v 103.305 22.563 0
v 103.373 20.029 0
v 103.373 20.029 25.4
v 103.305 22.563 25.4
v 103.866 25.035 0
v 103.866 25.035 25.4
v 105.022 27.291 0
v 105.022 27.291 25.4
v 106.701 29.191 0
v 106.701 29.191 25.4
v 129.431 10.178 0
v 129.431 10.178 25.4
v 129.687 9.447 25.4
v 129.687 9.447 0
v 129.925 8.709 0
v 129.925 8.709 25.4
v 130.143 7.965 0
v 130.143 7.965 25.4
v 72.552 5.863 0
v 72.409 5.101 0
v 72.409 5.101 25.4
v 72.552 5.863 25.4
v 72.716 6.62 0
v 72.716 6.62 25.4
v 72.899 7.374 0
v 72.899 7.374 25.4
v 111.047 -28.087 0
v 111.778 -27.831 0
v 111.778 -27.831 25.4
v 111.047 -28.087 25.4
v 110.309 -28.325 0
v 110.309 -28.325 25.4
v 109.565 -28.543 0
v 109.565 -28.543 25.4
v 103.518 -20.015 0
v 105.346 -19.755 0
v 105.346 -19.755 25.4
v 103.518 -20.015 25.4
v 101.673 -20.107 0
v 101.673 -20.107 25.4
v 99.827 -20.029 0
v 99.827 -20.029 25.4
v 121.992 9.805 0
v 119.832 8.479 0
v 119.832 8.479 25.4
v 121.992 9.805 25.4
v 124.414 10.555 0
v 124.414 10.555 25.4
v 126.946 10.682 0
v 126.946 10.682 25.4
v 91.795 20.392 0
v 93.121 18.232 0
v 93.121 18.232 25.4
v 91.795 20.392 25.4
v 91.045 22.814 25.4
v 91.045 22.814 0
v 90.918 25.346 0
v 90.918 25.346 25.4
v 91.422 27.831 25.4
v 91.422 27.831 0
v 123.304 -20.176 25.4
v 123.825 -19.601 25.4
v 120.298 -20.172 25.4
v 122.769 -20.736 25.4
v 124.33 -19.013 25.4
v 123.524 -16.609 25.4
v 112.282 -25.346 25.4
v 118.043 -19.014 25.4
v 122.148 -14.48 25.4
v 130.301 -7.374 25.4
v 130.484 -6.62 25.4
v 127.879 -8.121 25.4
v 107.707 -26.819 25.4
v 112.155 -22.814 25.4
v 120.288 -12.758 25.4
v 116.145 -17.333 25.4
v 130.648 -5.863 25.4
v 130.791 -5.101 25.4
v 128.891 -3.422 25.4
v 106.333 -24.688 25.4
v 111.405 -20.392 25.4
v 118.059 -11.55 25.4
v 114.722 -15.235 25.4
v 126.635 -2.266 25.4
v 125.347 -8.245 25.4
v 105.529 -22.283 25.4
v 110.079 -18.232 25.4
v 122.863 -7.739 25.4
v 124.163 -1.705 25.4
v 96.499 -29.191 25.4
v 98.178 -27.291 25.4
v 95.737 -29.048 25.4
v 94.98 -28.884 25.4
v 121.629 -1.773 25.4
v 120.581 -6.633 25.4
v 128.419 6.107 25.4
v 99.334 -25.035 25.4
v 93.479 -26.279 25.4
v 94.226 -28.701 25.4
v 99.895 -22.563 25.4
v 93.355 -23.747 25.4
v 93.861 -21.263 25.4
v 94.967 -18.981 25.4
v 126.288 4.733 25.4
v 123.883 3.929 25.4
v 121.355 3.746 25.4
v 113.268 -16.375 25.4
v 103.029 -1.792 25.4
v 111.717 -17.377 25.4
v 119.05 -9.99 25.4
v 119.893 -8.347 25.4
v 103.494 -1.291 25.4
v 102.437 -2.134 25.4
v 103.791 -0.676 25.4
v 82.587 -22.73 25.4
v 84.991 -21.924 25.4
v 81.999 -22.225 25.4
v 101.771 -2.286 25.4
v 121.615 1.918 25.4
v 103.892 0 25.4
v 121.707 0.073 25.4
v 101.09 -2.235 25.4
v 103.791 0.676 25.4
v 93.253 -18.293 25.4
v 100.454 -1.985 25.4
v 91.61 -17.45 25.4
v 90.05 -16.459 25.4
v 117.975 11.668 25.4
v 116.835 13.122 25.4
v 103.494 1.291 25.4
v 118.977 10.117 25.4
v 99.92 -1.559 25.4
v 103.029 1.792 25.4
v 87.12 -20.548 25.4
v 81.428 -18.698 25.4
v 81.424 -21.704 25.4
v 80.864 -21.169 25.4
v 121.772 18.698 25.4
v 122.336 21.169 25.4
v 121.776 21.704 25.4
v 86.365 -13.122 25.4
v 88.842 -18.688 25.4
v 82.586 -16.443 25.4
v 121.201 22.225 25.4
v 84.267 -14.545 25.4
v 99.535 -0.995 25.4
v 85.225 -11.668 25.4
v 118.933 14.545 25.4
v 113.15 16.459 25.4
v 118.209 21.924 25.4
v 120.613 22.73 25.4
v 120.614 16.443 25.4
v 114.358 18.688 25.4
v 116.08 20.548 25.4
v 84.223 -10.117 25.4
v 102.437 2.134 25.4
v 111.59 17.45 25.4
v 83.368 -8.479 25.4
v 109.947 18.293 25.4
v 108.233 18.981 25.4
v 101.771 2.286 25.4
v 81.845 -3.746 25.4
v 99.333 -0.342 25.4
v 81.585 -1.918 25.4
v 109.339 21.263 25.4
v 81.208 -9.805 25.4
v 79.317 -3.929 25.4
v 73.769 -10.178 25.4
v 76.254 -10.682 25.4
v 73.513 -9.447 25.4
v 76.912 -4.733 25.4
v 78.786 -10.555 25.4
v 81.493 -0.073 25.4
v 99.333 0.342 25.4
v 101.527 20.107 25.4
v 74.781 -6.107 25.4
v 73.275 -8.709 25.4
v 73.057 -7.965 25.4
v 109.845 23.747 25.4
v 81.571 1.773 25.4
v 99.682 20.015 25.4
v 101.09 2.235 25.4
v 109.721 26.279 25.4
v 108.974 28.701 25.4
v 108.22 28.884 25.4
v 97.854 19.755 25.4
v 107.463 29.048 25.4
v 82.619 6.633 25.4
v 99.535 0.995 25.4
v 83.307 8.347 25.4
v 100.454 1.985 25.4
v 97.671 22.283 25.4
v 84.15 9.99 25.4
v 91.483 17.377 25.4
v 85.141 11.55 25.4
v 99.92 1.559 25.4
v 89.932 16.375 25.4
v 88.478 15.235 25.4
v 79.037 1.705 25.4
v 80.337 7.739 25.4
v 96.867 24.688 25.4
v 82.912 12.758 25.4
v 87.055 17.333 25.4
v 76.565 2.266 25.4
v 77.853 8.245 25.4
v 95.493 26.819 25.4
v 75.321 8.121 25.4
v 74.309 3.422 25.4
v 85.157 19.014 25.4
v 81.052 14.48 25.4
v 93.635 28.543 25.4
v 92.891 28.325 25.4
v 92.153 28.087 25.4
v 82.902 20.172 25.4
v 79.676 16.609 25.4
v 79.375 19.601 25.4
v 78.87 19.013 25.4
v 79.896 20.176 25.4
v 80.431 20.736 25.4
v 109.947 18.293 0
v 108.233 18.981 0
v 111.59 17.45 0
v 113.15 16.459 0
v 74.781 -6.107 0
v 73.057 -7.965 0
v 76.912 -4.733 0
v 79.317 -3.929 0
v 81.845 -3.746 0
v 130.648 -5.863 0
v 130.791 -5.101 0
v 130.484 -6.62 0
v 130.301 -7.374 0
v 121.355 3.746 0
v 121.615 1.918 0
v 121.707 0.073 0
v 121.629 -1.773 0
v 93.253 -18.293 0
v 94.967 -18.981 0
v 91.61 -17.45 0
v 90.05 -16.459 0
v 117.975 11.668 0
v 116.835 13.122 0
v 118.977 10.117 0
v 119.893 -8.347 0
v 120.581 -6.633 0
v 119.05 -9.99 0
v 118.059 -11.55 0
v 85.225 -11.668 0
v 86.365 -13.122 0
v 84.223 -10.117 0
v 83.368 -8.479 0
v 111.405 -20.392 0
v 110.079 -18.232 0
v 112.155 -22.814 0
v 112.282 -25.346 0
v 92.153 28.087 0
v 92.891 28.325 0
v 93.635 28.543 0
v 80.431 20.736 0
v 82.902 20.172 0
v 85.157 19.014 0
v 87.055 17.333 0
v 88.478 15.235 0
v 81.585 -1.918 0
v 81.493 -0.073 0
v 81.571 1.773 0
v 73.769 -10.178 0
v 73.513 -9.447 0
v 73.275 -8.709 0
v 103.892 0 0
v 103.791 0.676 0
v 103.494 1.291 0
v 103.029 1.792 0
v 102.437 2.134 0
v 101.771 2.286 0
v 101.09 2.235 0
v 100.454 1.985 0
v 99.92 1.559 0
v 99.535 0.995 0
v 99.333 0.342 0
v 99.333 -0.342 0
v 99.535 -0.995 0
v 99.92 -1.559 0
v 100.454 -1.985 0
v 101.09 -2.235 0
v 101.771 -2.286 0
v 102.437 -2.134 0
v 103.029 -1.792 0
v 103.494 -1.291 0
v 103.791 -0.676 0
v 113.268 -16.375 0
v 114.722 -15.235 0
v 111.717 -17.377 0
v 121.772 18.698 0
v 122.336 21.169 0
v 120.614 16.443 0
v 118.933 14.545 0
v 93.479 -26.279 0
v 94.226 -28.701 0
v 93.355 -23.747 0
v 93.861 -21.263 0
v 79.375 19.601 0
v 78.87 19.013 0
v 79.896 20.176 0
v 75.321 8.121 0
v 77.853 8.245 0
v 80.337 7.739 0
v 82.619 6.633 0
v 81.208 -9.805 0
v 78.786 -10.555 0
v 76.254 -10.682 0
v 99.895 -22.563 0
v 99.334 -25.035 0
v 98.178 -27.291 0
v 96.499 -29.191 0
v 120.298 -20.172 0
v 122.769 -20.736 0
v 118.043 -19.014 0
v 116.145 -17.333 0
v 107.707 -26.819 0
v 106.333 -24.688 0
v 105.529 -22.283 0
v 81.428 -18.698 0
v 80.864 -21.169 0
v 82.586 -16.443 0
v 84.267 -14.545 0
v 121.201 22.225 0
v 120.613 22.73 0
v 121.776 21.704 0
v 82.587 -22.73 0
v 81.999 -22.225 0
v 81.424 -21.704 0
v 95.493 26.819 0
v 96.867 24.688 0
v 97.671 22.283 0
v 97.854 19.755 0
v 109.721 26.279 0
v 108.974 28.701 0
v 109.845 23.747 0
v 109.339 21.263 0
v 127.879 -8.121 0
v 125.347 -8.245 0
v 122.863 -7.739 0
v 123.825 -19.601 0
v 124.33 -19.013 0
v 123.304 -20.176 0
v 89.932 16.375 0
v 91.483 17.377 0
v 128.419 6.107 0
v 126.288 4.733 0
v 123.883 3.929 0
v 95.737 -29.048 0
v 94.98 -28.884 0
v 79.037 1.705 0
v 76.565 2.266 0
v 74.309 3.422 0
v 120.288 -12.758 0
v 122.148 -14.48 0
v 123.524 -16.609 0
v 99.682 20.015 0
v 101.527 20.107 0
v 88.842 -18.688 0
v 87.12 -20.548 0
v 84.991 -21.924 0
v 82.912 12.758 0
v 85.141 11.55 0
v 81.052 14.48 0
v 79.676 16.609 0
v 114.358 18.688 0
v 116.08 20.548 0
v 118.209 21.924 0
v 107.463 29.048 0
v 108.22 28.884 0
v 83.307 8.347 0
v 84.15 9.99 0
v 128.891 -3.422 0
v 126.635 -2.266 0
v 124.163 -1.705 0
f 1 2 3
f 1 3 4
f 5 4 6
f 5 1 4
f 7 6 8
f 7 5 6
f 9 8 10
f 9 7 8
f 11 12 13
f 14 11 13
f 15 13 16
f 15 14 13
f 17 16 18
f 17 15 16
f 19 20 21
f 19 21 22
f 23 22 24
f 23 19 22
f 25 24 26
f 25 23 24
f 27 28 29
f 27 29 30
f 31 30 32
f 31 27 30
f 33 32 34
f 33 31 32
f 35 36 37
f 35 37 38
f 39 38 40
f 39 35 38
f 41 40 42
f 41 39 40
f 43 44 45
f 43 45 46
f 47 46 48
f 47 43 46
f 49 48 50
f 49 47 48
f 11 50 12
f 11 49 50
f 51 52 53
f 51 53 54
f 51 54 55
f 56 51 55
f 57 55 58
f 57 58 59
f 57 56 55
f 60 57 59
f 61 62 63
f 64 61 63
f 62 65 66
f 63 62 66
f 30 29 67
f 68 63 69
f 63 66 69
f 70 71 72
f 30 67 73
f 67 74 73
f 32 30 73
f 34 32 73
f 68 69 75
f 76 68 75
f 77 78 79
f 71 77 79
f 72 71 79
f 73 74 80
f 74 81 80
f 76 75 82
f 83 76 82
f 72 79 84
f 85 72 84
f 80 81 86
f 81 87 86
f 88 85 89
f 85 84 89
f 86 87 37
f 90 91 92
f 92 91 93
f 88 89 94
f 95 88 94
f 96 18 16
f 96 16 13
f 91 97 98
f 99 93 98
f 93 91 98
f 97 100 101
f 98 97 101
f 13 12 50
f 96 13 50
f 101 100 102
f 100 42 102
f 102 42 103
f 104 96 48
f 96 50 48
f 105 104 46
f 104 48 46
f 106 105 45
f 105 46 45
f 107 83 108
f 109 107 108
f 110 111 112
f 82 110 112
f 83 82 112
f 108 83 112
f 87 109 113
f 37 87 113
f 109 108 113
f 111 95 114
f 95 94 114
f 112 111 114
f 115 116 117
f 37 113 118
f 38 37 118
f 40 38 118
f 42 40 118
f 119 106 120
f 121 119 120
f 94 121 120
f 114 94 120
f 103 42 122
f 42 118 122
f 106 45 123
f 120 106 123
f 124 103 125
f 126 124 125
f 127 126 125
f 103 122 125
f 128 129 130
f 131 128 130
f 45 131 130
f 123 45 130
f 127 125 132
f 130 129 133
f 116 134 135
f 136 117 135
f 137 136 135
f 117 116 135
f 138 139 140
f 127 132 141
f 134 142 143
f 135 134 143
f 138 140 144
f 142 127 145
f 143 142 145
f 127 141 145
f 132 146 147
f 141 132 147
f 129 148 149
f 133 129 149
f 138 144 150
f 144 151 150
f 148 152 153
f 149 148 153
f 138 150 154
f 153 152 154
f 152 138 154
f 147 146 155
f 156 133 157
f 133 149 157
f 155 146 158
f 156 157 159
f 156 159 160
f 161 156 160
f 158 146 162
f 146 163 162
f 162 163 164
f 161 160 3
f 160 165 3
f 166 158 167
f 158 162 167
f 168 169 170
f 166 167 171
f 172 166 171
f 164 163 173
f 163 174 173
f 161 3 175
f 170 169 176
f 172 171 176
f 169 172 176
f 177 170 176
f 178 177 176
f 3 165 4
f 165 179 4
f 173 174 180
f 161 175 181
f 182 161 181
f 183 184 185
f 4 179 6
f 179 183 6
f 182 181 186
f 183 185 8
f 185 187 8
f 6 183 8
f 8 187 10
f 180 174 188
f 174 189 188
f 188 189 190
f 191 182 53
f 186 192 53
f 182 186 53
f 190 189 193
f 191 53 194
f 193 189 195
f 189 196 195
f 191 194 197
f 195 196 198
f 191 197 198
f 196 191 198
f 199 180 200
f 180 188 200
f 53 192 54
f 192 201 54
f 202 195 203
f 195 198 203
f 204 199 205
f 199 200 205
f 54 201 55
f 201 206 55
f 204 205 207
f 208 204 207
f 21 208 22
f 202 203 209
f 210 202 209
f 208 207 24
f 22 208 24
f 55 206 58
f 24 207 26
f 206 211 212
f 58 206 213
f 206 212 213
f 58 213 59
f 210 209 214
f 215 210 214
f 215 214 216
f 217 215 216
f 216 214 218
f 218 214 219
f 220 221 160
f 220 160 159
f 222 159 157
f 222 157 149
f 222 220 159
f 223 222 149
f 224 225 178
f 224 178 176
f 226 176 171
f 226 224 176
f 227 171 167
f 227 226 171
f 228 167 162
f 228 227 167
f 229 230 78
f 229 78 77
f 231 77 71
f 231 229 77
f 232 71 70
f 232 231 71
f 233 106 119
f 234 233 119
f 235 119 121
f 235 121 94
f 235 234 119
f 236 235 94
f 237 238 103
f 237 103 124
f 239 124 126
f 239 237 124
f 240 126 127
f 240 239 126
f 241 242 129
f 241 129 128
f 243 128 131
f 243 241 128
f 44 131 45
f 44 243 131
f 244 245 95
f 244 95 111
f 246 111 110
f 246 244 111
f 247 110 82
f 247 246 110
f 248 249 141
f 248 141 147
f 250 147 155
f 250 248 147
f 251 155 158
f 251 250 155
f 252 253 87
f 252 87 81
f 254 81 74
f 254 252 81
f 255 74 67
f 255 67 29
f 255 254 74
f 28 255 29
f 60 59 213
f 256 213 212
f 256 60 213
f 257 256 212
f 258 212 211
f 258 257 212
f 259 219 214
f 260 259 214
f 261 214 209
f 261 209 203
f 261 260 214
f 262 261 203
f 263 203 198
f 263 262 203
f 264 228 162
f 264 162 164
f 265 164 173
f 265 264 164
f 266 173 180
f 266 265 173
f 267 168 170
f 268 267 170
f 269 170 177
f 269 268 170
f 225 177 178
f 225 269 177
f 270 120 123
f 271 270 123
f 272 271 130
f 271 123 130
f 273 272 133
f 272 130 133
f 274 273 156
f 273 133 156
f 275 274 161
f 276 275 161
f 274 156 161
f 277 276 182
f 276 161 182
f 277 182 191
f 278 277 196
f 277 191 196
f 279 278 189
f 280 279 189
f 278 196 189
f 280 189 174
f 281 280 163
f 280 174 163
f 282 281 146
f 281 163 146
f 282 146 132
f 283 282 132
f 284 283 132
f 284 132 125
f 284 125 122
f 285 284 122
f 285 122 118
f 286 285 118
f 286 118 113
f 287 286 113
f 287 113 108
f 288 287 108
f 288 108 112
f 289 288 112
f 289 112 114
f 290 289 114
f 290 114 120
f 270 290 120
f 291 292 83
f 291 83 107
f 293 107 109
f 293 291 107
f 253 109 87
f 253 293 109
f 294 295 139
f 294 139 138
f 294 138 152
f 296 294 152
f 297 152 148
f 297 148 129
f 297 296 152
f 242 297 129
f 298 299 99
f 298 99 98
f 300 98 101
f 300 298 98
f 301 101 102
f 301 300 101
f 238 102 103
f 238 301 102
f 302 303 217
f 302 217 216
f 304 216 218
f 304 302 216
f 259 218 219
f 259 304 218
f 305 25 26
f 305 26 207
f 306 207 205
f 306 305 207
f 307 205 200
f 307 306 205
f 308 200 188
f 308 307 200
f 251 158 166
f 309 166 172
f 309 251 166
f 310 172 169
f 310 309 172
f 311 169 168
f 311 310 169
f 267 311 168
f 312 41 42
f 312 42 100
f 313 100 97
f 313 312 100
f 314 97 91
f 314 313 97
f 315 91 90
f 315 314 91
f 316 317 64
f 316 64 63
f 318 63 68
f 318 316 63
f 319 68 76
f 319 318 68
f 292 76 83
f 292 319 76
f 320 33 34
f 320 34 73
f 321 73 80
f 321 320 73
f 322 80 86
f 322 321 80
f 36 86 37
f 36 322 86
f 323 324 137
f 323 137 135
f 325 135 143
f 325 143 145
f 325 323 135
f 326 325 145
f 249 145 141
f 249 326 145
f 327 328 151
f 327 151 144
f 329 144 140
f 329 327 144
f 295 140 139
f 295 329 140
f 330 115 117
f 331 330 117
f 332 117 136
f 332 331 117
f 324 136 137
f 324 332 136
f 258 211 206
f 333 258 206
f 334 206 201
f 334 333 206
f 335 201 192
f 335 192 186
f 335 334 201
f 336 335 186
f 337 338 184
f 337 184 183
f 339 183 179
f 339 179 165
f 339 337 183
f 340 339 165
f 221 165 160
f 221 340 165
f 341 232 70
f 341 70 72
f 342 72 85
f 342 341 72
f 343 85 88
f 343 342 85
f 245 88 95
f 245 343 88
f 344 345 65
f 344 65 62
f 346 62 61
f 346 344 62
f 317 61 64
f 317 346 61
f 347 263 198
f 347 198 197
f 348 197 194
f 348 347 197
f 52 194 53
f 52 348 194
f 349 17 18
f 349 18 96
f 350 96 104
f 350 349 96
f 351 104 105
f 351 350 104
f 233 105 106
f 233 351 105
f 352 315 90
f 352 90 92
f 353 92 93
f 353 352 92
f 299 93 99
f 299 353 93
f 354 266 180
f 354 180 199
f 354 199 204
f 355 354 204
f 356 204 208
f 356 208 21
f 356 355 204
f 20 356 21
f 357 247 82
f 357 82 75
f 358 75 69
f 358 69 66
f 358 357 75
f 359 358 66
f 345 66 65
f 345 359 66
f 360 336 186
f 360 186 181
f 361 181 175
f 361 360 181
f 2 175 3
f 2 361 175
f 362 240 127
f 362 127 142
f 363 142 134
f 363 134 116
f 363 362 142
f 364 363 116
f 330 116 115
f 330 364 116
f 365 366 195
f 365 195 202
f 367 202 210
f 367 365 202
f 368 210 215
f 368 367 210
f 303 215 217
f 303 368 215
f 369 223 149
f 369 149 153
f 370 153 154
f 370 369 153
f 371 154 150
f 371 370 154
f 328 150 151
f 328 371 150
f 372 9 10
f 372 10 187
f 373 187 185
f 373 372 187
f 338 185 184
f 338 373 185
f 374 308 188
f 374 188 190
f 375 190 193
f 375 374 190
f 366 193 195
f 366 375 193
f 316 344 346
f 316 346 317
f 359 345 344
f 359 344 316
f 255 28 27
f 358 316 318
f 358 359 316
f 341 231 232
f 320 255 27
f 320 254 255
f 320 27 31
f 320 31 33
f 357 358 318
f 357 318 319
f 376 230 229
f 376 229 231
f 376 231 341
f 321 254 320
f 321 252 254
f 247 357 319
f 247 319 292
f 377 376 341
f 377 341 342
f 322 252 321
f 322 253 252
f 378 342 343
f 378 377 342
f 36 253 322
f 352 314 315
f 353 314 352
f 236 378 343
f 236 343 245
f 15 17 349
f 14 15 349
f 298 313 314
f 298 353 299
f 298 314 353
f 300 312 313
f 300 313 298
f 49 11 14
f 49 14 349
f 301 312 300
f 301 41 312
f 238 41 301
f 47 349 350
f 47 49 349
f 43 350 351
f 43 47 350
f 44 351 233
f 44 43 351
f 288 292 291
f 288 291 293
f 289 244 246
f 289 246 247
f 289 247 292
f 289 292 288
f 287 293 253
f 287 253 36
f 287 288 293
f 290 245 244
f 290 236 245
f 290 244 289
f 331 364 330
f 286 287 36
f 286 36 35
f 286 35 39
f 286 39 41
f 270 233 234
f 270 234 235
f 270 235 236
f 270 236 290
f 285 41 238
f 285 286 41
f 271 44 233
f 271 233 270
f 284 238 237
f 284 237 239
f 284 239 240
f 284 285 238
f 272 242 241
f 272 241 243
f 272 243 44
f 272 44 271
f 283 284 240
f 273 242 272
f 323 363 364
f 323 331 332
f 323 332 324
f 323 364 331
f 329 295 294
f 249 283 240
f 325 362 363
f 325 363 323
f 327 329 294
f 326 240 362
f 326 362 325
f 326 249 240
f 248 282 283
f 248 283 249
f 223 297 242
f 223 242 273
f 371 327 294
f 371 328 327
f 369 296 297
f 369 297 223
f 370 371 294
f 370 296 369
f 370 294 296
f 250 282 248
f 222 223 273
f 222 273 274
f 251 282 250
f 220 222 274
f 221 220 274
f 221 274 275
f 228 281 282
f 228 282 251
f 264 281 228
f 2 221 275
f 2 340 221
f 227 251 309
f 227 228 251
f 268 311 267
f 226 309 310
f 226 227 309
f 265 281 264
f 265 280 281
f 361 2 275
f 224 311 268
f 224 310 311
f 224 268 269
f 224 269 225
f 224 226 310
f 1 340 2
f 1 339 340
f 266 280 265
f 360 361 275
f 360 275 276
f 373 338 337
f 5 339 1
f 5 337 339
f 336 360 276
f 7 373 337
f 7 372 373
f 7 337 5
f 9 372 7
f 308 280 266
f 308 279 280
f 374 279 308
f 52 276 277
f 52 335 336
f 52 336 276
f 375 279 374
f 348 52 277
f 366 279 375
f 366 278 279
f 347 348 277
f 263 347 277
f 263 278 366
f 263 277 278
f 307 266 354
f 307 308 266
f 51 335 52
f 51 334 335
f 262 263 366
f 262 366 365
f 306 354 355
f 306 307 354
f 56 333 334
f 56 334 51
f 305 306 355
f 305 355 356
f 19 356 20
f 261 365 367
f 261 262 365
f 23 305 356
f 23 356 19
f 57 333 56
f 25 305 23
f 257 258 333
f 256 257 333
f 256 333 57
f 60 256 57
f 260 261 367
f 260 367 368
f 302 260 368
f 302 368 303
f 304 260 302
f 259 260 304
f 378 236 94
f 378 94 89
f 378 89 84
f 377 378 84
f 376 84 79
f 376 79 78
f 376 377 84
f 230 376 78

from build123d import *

# Parameters (mm, degrees)
SKETCH1_R           = 0.396875
BOSS_EXTRUDE1_DEPTH = 25.4
SKETCH3_R           = 2.29235
CUT_EXTRUDE1_DEPTH  = 45.3009


with BuildPart() as part:
    # Sketch1 → Boss-Extrude1 (new body)
    with BuildSketch(Plane(origin=(0, 0, 0), x_dir=(-1, 0, 0), z_dir=(0, 0, -1))):
        with BuildLine():
            ThreePointArc((-94.226399104, -28.701297083), (-93.354822314, -23.746772531), (-94.966890975, -18.98146097))
            ThreePointArc((-94.966890975, -18.98146097), (-92.421623219, -17.889980312), (-90.050475192, -16.459115183))
            ThreePointArc((-90.050475192, -16.459115183), (-87.119940237, -20.547993332), (-82.587097641, -22.729803966))
            ThreePointArc((-82.587097641, -22.729803966), (-81.710050828, -21.966437271), (-80.863625765, -21.169251948))
            ThreePointArc((-80.863625765, -21.169251948), (-82.5860804, -16.442719427), (-86.364828593, -13.121872888))
            ThreePointArc((-86.364828593, -13.121872888), (-84.706302386, -10.903989032), (-83.368260523, -8.479249468))
            ThreePointArc((-83.368260523, -8.479249468), (-78.785903731, -10.555054341), (-73.769441574, -10.178136478))
            ThreePointArc((-73.769441574, -10.178136478), (-73.391580101, -9.078518121), (-73.057147156, -7.964922849))
            ThreePointArc((-73.057147156, -7.964922849), (-76.912102887, -4.732852931), (-81.845018087, -3.746289563))
            ThreePointArc((-81.845018087, -3.746289563), (-81.517634186, -0.996282698), (-81.571225724, 1.772624294))
            ThreePointArc((-81.571225724, 1.772624294), (-76.564885896, 2.266102937), (-72.408961163, 5.10075446))
            ThreePointArc((-72.408961163, 5.10075446), (-72.631532707, 6.241982628), (-72.898702917, 7.373600896))
            ThreePointArc((-72.898702917, 7.373600896), (-77.853227469, 8.245177686), (-82.61853903, 6.633109025))
            ThreePointArc((-82.61853903, 6.633109025), (-83.710019688, 9.178376781), (-85.140884817, 11.549524808))
            ThreePointArc((-85.140884817, 11.549524808), (-81.052006668, 14.480059763), (-78.870196034, 19.012902359))
            ThreePointArc((-78.870196034, 19.012902359), (-79.633562729, 19.889949172), (-80.430748052, 20.736374235))
            ThreePointArc((-80.430748052, 20.736374235), (-85.157280573, 19.0139196), (-88.478127112, 15.235171407))
            ThreePointArc((-88.478127112, 15.235171407), (-90.696010968, 16.893697614), (-93.120750532, 18.231739477))
            ThreePointArc((-93.120750532, 18.231739477), (-91.044945659, 22.814096269), (-91.421863522, 27.830558426))
            ThreePointArc((-91.421863522, 27.830558426), (-92.521481879, 28.208419899), (-93.635077151, 28.542852844))
            ThreePointArc((-93.635077151, 28.542852844), (-96.867147069, 24.687897113), (-97.853710437, 19.754981913))
            ThreePointArc((-97.853710437, 19.754981913), (-100.603717302, 20.082365814), (-103.372624294, 20.028774276))
            ThreePointArc((-103.372624294, 20.028774276), (-103.866102937, 25.035114104), (-106.70075446, 29.191038837))
            ThreePointArc((-106.70075446, 29.191038837), (-107.841982628, 28.968467293), (-108.973600896, 28.701297083))
            ThreePointArc((-108.973600896, 28.701297083), (-109.845177686, 23.746772531), (-108.233109025, 18.98146097))
            ThreePointArc((-108.233109025, 18.98146097), (-110.778376781, 17.889980312), (-113.149524808, 16.459115183))
            ThreePointArc((-113.149524808, 16.459115183), (-116.080059763, 20.547993332), (-120.612902359, 22.729803966))
            ThreePointArc((-120.612902359, 22.729803966), (-121.489949172, 21.966437271), (-122.336374235, 21.169251948))
            ThreePointArc((-122.336374235, 21.169251948), (-120.6139196, 16.442719427), (-116.835171407, 13.121872888))
            ThreePointArc((-116.835171407, 13.121872888), (-118.493697614, 10.903989032), (-119.831739477, 8.479249468))
            ThreePointArc((-119.831739477, 8.479249468), (-124.414096269, 10.555054341), (-129.430558426, 10.178136478))
            ThreePointArc((-129.430558426, 10.178136478), (-129.808419899, 9.078518121), (-130.142852844, 7.964922849))
            ThreePointArc((-130.142852844, 7.964922849), (-126.287897113, 4.732852931), (-121.354981913, 3.746289563))
            ThreePointArc((-121.354981913, 3.746289563), (-121.682365814, 0.996282698), (-121.628774276, -1.772624294))
            ThreePointArc((-121.628774276, -1.772624294), (-126.635114104, -2.266102937), (-130.791038837, -5.10075446))
            ThreePointArc((-130.791038837, -5.10075446), (-130.568467293, -6.241982628), (-130.301297083, -7.373600896))
            ThreePointArc((-130.301297083, -7.373600896), (-125.346772531, -8.245177686), (-120.58146097, -6.633109025))
            ThreePointArc((-120.58146097, -6.633109025), (-119.489980312, -9.178376781), (-118.059115183, -11.549524808))
            ThreePointArc((-118.059115183, -11.549524808), (-122.147993332, -14.480059763), (-124.329803966, -19.012902359))
            ThreePointArc((-124.329803966, -19.012902359), (-123.566437271, -19.889949172), (-122.769251948, -20.736374235))
            ThreePointArc((-122.769251948, -20.736374235), (-118.042719427, -19.0139196), (-114.721872888, -15.235171407))
            ThreePointArc((-114.721872888, -15.235171407), (-112.503989032, -16.893697614), (-110.079249468, -18.231739477))
            ThreePointArc((-110.079249468, -18.231739477), (-112.155054341, -22.814096269), (-111.778136478, -27.830558426))
            ThreePointArc((-111.778136478, -27.830558426), (-110.678518121, -28.208419899), (-109.564922849, -28.542852844))
            ThreePointArc((-109.564922849, -28.542852844), (-106.332852931, -24.687897113), (-105.346289563, -19.754981913))
            ThreePointArc((-105.346289563, -19.754981913), (-102.596282698, -20.082365814), (-99.827375706, -20.028774276))
            ThreePointArc((-99.827375706, -20.028774276), (-99.333897063, -25.035114104), (-96.49924554, -29.191038837))
            ThreePointArc((-96.49924554, -29.191038837), (-95.358017372, -28.968467293), (-94.226399104, -28.701297083))
        make_face()
        with Locations((-101.6, 0)):
            Circle(SKETCH1_R, mode=Mode.SUBTRACT)
    extrude(amount=-BOSS_EXTRUDE1_DEPTH)

    # Sketch3 → Cut-Extrude1 (cut)
    with BuildSketch(Plane.XY.offset(25.4)):
        with Locations((101.6, 0)):
            Circle(SKETCH3_R)
    extrude(amount=-CUT_EXTRUDE1_DEPTH, mode=Mode.SUBTRACT)


solid = part.part
